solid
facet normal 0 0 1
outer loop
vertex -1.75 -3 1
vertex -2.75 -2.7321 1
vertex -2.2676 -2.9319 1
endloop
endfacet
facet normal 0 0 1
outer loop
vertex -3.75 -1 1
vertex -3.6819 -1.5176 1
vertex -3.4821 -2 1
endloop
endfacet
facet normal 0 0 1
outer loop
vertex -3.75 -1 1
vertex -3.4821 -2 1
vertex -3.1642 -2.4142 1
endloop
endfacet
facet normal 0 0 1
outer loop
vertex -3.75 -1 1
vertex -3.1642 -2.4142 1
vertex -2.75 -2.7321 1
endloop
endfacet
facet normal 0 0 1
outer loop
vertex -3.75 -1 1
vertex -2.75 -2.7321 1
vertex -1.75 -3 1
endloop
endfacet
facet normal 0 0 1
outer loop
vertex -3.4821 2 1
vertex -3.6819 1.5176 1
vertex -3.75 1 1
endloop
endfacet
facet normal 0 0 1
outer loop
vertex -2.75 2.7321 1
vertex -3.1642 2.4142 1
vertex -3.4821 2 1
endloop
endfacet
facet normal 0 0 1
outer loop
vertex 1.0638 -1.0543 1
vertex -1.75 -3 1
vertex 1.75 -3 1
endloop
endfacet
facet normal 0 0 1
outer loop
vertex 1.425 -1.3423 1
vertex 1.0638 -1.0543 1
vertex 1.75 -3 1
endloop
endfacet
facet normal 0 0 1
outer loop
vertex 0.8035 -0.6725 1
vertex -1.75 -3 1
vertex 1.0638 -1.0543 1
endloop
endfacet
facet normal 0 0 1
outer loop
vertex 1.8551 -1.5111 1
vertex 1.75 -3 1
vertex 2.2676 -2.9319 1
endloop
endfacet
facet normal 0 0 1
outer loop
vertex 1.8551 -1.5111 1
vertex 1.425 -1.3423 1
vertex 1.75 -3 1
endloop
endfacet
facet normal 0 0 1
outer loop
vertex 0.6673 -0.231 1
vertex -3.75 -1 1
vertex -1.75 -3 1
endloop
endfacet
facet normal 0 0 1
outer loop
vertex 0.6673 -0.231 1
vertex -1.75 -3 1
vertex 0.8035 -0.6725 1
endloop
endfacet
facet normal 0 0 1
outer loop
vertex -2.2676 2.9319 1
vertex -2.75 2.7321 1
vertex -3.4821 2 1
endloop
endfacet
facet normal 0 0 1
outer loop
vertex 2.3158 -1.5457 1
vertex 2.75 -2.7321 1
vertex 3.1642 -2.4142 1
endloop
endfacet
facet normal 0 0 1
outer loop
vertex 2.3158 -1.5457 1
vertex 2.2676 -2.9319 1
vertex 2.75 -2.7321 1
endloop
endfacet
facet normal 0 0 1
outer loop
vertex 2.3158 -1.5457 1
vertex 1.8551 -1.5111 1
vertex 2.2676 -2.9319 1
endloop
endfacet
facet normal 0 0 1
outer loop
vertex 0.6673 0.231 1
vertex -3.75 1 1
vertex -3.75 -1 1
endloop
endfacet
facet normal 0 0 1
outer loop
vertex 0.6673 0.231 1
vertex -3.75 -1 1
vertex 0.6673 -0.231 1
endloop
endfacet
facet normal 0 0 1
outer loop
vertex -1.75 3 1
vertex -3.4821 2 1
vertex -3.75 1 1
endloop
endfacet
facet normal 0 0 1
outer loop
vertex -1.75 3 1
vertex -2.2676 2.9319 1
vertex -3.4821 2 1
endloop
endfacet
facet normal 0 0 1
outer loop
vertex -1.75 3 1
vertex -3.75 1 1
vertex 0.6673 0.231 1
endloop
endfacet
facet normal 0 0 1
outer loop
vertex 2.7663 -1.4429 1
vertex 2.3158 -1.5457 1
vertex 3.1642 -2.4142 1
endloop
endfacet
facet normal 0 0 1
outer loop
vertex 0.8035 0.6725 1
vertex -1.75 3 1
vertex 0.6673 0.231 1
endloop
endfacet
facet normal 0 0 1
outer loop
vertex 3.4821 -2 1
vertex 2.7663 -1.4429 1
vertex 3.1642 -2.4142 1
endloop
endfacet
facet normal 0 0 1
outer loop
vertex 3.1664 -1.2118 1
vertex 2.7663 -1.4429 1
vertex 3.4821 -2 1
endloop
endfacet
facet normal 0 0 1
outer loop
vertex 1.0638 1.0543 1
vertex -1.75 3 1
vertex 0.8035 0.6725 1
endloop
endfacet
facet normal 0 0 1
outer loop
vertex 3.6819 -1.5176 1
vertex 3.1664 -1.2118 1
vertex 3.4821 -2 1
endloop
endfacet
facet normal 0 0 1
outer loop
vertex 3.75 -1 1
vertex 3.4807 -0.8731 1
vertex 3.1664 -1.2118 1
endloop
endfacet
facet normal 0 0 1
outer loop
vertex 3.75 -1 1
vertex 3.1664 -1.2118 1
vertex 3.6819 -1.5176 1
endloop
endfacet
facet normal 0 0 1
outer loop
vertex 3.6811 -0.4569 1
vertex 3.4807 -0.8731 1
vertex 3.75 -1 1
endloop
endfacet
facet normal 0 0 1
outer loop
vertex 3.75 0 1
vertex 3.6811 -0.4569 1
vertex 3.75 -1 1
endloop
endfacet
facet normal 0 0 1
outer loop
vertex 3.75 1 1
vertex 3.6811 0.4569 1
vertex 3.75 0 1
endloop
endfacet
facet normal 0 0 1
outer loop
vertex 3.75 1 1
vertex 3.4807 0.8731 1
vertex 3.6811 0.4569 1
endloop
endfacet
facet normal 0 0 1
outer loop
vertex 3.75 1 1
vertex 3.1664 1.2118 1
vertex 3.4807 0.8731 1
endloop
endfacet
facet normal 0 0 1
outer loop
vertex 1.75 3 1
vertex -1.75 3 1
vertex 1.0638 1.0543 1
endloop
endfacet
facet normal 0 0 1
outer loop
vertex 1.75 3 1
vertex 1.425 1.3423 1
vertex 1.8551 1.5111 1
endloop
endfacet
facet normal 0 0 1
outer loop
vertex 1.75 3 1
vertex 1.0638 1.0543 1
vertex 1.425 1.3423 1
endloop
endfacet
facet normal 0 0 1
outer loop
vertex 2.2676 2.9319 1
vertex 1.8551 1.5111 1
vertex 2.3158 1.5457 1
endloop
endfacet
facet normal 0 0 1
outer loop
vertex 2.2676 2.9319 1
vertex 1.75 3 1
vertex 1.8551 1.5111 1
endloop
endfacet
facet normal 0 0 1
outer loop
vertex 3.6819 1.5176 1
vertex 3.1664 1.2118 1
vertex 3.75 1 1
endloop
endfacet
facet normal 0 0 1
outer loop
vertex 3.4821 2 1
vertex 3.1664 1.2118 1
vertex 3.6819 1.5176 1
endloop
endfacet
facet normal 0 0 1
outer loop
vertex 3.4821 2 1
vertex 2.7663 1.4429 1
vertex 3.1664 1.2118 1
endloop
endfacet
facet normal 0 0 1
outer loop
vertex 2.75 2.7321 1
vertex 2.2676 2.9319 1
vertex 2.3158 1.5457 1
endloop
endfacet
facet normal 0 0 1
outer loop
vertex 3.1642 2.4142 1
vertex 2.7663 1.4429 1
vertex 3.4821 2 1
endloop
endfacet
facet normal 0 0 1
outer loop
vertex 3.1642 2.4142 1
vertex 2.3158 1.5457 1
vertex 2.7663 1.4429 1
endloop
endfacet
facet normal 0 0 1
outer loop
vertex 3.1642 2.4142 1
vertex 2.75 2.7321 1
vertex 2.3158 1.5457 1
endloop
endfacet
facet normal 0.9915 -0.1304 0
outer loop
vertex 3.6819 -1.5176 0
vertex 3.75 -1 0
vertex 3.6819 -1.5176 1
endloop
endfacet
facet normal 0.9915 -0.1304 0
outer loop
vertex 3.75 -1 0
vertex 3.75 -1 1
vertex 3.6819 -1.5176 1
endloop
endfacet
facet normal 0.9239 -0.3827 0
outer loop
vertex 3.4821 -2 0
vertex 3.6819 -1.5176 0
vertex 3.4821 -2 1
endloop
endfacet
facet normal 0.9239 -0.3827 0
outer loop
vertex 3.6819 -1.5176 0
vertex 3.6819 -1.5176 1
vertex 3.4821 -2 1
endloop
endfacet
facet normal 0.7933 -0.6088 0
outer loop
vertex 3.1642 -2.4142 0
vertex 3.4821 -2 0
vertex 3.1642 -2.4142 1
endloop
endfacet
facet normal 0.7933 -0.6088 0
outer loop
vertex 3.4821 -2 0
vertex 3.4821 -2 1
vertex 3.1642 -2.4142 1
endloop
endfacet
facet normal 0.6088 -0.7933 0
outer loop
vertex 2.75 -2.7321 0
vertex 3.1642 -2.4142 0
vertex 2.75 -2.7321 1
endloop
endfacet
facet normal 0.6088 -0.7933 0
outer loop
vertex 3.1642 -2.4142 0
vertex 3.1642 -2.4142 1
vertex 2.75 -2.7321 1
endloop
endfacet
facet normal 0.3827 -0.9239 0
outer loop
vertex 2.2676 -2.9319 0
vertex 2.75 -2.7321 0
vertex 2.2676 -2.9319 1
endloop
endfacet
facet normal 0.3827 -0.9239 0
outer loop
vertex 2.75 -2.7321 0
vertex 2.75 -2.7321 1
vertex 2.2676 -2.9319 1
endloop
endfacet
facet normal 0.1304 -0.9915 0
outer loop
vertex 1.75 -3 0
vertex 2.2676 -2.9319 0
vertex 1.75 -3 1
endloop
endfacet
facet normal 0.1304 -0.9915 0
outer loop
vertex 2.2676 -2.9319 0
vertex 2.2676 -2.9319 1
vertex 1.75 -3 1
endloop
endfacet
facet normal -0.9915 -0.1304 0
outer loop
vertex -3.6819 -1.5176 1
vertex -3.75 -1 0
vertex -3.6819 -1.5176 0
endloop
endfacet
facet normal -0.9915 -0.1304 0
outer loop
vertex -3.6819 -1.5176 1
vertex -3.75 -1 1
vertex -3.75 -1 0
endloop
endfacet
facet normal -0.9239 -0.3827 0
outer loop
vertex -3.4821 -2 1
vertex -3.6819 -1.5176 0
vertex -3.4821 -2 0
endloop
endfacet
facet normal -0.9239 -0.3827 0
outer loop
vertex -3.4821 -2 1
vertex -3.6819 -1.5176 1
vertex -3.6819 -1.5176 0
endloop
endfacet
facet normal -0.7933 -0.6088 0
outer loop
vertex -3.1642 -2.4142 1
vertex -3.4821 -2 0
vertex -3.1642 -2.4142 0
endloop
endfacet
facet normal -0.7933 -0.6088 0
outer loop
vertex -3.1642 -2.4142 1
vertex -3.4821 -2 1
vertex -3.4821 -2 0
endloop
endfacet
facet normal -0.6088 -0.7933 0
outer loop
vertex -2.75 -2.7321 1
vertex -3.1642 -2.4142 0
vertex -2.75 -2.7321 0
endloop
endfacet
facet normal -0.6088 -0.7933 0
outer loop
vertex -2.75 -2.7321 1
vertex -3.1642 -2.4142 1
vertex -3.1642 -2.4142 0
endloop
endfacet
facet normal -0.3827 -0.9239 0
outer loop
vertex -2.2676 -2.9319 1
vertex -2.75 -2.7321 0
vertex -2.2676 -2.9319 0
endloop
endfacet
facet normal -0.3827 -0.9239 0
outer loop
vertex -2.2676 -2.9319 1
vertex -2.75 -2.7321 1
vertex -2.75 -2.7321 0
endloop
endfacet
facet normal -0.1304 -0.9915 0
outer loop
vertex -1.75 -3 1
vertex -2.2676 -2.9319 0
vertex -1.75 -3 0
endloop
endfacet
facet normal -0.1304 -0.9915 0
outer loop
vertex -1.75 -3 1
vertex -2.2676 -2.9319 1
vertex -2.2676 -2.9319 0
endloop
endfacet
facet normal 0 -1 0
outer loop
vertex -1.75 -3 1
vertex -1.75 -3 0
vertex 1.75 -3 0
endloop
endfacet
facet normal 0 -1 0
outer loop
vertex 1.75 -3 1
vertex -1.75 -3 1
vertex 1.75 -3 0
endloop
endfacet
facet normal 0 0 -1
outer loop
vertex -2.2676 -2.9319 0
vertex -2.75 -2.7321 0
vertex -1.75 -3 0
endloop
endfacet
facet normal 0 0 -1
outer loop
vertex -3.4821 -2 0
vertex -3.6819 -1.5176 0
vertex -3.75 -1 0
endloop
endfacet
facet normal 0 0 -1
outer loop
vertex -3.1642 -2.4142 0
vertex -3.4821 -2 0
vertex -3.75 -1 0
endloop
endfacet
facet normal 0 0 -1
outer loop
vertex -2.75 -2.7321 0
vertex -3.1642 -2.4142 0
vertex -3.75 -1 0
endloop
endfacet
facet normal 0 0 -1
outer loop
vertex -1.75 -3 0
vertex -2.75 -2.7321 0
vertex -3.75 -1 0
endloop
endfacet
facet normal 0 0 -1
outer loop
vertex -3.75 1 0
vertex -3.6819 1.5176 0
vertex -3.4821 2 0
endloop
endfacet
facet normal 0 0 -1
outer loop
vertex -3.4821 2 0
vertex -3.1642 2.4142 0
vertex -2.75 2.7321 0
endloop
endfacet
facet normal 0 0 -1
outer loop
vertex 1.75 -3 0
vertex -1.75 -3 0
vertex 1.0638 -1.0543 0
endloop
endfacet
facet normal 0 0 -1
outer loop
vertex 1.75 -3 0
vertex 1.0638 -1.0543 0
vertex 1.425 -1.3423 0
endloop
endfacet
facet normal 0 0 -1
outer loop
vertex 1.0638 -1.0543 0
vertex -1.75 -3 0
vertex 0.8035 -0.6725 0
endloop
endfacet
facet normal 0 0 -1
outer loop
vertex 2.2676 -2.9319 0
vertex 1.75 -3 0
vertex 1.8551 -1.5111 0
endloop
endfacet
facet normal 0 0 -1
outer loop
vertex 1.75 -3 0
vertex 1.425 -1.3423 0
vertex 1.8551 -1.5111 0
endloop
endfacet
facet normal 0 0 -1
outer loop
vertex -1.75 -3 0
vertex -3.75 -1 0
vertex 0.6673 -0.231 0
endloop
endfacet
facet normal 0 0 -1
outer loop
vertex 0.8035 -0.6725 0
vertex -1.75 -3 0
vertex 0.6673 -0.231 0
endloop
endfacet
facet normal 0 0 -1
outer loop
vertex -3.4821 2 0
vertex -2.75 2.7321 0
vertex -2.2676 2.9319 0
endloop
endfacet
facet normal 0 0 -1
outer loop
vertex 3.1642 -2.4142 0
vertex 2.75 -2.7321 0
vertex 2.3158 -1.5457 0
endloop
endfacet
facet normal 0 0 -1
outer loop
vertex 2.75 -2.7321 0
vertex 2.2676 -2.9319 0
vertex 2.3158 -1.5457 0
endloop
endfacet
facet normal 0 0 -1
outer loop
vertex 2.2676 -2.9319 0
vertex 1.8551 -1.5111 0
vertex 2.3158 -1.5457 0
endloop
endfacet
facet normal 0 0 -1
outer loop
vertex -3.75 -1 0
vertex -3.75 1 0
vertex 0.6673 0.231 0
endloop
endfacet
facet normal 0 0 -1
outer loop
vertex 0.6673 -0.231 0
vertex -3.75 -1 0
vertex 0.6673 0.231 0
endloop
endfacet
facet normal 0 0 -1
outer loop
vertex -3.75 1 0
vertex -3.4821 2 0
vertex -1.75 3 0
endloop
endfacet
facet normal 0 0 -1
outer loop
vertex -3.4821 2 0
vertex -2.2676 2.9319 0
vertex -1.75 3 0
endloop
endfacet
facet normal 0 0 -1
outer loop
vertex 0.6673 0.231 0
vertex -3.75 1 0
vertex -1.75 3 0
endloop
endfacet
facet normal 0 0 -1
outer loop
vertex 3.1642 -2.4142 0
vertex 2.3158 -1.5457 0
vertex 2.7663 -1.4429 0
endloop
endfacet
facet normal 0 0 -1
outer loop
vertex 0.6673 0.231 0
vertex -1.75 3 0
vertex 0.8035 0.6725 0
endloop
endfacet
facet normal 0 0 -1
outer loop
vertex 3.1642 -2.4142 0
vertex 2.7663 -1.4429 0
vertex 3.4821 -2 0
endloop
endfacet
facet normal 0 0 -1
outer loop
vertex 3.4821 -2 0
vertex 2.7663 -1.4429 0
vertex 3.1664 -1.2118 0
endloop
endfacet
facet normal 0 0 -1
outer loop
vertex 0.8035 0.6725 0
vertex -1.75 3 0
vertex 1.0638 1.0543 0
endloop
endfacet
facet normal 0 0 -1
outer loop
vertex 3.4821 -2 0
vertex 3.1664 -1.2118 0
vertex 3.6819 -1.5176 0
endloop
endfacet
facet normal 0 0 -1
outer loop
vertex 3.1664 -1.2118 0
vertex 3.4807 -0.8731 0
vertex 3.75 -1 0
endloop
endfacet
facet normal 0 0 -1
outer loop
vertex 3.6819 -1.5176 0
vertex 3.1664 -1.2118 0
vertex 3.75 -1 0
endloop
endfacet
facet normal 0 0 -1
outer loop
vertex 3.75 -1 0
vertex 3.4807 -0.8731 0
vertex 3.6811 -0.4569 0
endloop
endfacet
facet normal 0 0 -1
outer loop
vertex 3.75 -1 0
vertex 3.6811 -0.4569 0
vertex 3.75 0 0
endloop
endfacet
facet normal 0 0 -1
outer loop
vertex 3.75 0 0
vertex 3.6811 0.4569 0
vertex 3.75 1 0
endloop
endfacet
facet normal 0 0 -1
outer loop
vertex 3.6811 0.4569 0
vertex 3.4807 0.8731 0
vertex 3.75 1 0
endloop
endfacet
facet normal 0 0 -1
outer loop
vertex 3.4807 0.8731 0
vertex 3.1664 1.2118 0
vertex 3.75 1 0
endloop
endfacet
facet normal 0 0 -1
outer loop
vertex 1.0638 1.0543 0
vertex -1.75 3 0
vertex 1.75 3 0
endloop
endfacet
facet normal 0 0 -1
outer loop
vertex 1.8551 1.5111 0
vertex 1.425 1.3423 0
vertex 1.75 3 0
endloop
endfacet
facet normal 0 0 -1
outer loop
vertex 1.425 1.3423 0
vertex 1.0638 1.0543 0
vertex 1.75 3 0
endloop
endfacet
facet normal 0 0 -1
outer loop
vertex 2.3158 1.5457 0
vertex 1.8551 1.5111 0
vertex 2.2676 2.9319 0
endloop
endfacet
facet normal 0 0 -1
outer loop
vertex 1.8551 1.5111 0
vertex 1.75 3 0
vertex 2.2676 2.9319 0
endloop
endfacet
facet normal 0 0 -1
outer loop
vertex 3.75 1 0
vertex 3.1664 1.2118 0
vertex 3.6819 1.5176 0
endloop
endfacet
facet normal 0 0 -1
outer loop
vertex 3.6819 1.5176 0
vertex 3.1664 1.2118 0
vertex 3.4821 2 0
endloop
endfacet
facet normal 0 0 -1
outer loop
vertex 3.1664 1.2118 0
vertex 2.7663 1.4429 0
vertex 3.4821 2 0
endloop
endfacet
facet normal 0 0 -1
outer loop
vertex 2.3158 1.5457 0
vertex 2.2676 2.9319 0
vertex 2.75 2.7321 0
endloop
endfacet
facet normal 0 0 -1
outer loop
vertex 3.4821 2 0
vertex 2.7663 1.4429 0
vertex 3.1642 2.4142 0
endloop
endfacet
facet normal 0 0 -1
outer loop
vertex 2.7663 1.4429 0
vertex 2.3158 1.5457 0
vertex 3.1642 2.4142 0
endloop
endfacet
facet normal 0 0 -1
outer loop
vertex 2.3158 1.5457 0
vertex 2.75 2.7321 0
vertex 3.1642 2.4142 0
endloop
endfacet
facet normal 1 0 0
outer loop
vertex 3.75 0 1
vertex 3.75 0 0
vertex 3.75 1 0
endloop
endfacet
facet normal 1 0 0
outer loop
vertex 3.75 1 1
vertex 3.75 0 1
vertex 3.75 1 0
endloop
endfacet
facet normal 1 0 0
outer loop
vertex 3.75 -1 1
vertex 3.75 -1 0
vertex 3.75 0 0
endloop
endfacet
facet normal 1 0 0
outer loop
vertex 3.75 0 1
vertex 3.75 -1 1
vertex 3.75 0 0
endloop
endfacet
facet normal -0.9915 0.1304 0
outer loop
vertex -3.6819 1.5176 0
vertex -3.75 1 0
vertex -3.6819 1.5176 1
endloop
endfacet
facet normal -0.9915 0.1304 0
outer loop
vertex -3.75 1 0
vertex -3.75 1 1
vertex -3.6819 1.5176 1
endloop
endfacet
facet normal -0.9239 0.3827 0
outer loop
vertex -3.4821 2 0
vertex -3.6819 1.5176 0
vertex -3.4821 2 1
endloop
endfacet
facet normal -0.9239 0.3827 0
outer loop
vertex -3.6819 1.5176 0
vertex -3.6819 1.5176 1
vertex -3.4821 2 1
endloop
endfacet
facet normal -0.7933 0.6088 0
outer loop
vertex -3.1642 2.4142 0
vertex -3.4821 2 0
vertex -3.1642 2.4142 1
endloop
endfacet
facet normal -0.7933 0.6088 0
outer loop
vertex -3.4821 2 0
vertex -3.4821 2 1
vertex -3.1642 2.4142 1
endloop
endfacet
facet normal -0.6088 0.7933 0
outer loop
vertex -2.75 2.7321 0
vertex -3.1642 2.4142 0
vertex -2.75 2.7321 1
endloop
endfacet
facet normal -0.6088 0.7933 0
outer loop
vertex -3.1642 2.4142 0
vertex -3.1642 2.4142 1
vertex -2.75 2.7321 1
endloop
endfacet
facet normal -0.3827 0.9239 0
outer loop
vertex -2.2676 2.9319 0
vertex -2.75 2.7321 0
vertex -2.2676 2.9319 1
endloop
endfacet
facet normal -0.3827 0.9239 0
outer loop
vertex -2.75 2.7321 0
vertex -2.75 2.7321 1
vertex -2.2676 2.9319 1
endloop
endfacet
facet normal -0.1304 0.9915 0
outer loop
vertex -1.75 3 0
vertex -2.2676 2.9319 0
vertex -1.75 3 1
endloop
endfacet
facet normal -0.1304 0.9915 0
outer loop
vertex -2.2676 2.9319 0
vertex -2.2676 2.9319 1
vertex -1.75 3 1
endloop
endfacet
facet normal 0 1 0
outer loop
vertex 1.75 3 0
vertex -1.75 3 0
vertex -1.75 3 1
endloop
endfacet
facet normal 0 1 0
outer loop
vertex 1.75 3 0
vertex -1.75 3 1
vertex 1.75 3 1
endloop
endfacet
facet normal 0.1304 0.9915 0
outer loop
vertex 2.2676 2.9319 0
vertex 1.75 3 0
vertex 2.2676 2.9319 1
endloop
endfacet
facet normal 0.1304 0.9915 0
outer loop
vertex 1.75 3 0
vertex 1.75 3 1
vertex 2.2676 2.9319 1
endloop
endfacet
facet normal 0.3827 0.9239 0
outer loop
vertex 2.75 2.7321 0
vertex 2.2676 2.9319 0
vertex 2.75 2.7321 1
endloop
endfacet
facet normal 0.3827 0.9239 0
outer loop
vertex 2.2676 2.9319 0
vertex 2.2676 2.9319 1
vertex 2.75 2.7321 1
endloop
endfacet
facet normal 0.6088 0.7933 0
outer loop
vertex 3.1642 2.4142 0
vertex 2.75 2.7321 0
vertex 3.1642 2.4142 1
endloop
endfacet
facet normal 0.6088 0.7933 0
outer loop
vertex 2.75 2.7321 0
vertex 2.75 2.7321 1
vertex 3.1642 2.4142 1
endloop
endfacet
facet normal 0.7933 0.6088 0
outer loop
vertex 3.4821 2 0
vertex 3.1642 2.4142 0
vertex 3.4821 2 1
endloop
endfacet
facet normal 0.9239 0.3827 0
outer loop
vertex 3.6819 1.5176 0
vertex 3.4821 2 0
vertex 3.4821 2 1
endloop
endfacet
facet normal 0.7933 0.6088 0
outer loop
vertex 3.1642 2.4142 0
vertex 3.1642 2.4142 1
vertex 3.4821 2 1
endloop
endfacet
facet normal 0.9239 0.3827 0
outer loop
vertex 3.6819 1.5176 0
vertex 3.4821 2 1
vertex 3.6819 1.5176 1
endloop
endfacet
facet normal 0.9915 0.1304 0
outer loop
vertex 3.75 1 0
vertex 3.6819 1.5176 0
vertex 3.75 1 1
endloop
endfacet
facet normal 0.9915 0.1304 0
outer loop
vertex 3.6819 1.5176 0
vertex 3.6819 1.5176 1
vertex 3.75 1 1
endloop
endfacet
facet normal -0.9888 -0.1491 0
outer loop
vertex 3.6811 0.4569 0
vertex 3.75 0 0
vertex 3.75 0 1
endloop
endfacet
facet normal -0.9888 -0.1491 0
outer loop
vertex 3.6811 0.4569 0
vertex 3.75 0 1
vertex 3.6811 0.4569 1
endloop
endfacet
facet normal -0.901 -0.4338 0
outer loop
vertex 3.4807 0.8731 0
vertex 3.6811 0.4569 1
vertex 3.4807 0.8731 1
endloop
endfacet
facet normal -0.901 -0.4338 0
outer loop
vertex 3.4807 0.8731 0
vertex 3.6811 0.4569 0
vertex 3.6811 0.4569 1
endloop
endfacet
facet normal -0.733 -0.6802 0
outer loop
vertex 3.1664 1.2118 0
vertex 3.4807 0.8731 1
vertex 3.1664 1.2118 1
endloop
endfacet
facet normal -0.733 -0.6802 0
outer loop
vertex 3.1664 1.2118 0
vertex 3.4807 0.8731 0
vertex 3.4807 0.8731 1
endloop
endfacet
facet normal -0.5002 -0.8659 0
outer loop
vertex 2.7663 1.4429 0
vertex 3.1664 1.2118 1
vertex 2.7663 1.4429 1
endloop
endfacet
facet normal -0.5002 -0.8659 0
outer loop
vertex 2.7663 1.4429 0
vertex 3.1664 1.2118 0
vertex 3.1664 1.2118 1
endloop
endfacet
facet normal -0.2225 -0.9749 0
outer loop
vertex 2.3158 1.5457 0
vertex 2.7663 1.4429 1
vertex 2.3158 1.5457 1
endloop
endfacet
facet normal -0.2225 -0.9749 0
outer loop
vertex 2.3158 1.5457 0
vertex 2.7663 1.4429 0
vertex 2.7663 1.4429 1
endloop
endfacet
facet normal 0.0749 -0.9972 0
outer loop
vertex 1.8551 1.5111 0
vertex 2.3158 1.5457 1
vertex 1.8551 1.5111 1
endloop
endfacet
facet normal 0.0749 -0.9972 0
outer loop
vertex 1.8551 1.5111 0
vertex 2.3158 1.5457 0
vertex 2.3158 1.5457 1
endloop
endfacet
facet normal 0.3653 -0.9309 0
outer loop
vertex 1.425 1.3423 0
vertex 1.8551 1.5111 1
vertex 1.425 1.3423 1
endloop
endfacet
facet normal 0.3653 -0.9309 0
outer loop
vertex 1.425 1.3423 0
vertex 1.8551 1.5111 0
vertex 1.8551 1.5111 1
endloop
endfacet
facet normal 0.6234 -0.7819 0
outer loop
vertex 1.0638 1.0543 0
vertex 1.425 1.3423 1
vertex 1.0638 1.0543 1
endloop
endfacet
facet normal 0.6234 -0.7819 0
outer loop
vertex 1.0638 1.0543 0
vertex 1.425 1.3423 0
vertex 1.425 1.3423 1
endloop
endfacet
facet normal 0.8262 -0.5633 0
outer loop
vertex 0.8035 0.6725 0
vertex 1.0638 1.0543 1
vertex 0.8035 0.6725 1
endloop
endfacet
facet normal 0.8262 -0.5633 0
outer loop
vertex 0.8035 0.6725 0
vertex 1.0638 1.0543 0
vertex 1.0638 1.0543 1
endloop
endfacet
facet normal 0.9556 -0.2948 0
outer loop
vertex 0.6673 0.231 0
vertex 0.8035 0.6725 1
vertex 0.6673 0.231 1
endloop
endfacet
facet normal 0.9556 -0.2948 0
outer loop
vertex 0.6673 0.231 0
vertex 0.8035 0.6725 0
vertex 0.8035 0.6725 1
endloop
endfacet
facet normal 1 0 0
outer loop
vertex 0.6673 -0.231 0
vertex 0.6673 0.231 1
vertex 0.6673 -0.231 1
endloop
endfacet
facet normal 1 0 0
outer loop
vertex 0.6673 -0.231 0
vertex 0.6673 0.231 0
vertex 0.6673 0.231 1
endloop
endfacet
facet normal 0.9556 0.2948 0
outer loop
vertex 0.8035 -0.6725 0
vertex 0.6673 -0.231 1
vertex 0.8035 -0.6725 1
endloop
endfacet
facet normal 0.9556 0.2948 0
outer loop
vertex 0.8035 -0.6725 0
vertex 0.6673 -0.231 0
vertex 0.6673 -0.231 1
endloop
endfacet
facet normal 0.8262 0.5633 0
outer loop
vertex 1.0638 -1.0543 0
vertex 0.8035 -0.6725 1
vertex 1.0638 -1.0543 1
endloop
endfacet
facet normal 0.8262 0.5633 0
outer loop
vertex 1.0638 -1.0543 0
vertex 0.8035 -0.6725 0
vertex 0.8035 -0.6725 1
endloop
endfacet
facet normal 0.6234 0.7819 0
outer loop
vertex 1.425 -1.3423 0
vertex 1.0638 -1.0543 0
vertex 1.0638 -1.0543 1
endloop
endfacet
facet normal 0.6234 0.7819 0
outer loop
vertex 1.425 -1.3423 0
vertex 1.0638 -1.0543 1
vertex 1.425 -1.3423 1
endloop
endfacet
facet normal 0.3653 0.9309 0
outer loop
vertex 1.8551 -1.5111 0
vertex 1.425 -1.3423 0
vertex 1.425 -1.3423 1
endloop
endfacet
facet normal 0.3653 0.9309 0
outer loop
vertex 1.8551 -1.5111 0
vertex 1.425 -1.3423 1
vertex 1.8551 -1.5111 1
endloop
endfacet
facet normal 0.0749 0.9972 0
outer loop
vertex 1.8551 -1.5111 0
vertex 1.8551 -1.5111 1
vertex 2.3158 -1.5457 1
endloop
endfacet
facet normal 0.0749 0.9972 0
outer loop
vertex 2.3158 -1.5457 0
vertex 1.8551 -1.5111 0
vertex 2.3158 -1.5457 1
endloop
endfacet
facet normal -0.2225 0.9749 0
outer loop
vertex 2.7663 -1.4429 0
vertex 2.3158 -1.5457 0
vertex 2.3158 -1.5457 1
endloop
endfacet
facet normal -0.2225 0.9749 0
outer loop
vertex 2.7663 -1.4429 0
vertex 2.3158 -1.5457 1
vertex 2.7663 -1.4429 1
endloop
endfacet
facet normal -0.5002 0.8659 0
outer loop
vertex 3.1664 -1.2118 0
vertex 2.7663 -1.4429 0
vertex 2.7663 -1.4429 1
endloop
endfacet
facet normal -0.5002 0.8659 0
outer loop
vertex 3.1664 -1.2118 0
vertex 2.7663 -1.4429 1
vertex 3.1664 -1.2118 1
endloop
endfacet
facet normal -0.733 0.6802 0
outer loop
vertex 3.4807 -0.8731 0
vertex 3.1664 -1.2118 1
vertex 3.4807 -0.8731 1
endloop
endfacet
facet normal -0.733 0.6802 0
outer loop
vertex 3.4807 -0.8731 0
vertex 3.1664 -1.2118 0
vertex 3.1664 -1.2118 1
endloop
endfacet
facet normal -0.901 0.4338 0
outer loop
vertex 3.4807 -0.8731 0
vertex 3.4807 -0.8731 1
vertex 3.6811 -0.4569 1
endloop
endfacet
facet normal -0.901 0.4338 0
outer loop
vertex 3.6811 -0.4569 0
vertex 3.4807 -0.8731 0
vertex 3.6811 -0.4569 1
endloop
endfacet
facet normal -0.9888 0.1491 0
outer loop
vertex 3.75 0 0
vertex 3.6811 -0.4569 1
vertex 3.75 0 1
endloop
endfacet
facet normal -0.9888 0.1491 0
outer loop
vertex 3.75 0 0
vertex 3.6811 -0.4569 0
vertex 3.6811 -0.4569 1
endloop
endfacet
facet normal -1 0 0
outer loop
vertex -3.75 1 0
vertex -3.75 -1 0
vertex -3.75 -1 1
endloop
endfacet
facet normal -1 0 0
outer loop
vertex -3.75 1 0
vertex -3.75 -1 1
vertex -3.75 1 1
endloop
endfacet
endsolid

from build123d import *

# Parameters (mm, degrees)
SKETCH_W  = 7.5
SKETCH_H  = 6
SKETCH_R  = 1.55
PAD_DEPTH = 1
FILLET_R  = 2


with BuildPart() as part:
    # Sketch → Pad (new body)
    with BuildSketch(Plane.XY):
        Rectangle(SKETCH_W, SKETCH_H)
        with Locations((2.2, 0)):
            Circle(SKETCH_R, mode=Mode.SUBTRACT)
    extrude(amount=PAD_DEPTH)

    # Fillet
    fillet_edges = [part.edges().sort_by_distance(p)[0] for p in [
        (-3.75, -3, 0.5),
        (3.75, -3, 0.5),
        (3.75, 3, 0.5),
        (-3.75, 3, 0.5),
    ]]
    fillet(fillet_edges, radius=FILLET_R)


solid = part.part
